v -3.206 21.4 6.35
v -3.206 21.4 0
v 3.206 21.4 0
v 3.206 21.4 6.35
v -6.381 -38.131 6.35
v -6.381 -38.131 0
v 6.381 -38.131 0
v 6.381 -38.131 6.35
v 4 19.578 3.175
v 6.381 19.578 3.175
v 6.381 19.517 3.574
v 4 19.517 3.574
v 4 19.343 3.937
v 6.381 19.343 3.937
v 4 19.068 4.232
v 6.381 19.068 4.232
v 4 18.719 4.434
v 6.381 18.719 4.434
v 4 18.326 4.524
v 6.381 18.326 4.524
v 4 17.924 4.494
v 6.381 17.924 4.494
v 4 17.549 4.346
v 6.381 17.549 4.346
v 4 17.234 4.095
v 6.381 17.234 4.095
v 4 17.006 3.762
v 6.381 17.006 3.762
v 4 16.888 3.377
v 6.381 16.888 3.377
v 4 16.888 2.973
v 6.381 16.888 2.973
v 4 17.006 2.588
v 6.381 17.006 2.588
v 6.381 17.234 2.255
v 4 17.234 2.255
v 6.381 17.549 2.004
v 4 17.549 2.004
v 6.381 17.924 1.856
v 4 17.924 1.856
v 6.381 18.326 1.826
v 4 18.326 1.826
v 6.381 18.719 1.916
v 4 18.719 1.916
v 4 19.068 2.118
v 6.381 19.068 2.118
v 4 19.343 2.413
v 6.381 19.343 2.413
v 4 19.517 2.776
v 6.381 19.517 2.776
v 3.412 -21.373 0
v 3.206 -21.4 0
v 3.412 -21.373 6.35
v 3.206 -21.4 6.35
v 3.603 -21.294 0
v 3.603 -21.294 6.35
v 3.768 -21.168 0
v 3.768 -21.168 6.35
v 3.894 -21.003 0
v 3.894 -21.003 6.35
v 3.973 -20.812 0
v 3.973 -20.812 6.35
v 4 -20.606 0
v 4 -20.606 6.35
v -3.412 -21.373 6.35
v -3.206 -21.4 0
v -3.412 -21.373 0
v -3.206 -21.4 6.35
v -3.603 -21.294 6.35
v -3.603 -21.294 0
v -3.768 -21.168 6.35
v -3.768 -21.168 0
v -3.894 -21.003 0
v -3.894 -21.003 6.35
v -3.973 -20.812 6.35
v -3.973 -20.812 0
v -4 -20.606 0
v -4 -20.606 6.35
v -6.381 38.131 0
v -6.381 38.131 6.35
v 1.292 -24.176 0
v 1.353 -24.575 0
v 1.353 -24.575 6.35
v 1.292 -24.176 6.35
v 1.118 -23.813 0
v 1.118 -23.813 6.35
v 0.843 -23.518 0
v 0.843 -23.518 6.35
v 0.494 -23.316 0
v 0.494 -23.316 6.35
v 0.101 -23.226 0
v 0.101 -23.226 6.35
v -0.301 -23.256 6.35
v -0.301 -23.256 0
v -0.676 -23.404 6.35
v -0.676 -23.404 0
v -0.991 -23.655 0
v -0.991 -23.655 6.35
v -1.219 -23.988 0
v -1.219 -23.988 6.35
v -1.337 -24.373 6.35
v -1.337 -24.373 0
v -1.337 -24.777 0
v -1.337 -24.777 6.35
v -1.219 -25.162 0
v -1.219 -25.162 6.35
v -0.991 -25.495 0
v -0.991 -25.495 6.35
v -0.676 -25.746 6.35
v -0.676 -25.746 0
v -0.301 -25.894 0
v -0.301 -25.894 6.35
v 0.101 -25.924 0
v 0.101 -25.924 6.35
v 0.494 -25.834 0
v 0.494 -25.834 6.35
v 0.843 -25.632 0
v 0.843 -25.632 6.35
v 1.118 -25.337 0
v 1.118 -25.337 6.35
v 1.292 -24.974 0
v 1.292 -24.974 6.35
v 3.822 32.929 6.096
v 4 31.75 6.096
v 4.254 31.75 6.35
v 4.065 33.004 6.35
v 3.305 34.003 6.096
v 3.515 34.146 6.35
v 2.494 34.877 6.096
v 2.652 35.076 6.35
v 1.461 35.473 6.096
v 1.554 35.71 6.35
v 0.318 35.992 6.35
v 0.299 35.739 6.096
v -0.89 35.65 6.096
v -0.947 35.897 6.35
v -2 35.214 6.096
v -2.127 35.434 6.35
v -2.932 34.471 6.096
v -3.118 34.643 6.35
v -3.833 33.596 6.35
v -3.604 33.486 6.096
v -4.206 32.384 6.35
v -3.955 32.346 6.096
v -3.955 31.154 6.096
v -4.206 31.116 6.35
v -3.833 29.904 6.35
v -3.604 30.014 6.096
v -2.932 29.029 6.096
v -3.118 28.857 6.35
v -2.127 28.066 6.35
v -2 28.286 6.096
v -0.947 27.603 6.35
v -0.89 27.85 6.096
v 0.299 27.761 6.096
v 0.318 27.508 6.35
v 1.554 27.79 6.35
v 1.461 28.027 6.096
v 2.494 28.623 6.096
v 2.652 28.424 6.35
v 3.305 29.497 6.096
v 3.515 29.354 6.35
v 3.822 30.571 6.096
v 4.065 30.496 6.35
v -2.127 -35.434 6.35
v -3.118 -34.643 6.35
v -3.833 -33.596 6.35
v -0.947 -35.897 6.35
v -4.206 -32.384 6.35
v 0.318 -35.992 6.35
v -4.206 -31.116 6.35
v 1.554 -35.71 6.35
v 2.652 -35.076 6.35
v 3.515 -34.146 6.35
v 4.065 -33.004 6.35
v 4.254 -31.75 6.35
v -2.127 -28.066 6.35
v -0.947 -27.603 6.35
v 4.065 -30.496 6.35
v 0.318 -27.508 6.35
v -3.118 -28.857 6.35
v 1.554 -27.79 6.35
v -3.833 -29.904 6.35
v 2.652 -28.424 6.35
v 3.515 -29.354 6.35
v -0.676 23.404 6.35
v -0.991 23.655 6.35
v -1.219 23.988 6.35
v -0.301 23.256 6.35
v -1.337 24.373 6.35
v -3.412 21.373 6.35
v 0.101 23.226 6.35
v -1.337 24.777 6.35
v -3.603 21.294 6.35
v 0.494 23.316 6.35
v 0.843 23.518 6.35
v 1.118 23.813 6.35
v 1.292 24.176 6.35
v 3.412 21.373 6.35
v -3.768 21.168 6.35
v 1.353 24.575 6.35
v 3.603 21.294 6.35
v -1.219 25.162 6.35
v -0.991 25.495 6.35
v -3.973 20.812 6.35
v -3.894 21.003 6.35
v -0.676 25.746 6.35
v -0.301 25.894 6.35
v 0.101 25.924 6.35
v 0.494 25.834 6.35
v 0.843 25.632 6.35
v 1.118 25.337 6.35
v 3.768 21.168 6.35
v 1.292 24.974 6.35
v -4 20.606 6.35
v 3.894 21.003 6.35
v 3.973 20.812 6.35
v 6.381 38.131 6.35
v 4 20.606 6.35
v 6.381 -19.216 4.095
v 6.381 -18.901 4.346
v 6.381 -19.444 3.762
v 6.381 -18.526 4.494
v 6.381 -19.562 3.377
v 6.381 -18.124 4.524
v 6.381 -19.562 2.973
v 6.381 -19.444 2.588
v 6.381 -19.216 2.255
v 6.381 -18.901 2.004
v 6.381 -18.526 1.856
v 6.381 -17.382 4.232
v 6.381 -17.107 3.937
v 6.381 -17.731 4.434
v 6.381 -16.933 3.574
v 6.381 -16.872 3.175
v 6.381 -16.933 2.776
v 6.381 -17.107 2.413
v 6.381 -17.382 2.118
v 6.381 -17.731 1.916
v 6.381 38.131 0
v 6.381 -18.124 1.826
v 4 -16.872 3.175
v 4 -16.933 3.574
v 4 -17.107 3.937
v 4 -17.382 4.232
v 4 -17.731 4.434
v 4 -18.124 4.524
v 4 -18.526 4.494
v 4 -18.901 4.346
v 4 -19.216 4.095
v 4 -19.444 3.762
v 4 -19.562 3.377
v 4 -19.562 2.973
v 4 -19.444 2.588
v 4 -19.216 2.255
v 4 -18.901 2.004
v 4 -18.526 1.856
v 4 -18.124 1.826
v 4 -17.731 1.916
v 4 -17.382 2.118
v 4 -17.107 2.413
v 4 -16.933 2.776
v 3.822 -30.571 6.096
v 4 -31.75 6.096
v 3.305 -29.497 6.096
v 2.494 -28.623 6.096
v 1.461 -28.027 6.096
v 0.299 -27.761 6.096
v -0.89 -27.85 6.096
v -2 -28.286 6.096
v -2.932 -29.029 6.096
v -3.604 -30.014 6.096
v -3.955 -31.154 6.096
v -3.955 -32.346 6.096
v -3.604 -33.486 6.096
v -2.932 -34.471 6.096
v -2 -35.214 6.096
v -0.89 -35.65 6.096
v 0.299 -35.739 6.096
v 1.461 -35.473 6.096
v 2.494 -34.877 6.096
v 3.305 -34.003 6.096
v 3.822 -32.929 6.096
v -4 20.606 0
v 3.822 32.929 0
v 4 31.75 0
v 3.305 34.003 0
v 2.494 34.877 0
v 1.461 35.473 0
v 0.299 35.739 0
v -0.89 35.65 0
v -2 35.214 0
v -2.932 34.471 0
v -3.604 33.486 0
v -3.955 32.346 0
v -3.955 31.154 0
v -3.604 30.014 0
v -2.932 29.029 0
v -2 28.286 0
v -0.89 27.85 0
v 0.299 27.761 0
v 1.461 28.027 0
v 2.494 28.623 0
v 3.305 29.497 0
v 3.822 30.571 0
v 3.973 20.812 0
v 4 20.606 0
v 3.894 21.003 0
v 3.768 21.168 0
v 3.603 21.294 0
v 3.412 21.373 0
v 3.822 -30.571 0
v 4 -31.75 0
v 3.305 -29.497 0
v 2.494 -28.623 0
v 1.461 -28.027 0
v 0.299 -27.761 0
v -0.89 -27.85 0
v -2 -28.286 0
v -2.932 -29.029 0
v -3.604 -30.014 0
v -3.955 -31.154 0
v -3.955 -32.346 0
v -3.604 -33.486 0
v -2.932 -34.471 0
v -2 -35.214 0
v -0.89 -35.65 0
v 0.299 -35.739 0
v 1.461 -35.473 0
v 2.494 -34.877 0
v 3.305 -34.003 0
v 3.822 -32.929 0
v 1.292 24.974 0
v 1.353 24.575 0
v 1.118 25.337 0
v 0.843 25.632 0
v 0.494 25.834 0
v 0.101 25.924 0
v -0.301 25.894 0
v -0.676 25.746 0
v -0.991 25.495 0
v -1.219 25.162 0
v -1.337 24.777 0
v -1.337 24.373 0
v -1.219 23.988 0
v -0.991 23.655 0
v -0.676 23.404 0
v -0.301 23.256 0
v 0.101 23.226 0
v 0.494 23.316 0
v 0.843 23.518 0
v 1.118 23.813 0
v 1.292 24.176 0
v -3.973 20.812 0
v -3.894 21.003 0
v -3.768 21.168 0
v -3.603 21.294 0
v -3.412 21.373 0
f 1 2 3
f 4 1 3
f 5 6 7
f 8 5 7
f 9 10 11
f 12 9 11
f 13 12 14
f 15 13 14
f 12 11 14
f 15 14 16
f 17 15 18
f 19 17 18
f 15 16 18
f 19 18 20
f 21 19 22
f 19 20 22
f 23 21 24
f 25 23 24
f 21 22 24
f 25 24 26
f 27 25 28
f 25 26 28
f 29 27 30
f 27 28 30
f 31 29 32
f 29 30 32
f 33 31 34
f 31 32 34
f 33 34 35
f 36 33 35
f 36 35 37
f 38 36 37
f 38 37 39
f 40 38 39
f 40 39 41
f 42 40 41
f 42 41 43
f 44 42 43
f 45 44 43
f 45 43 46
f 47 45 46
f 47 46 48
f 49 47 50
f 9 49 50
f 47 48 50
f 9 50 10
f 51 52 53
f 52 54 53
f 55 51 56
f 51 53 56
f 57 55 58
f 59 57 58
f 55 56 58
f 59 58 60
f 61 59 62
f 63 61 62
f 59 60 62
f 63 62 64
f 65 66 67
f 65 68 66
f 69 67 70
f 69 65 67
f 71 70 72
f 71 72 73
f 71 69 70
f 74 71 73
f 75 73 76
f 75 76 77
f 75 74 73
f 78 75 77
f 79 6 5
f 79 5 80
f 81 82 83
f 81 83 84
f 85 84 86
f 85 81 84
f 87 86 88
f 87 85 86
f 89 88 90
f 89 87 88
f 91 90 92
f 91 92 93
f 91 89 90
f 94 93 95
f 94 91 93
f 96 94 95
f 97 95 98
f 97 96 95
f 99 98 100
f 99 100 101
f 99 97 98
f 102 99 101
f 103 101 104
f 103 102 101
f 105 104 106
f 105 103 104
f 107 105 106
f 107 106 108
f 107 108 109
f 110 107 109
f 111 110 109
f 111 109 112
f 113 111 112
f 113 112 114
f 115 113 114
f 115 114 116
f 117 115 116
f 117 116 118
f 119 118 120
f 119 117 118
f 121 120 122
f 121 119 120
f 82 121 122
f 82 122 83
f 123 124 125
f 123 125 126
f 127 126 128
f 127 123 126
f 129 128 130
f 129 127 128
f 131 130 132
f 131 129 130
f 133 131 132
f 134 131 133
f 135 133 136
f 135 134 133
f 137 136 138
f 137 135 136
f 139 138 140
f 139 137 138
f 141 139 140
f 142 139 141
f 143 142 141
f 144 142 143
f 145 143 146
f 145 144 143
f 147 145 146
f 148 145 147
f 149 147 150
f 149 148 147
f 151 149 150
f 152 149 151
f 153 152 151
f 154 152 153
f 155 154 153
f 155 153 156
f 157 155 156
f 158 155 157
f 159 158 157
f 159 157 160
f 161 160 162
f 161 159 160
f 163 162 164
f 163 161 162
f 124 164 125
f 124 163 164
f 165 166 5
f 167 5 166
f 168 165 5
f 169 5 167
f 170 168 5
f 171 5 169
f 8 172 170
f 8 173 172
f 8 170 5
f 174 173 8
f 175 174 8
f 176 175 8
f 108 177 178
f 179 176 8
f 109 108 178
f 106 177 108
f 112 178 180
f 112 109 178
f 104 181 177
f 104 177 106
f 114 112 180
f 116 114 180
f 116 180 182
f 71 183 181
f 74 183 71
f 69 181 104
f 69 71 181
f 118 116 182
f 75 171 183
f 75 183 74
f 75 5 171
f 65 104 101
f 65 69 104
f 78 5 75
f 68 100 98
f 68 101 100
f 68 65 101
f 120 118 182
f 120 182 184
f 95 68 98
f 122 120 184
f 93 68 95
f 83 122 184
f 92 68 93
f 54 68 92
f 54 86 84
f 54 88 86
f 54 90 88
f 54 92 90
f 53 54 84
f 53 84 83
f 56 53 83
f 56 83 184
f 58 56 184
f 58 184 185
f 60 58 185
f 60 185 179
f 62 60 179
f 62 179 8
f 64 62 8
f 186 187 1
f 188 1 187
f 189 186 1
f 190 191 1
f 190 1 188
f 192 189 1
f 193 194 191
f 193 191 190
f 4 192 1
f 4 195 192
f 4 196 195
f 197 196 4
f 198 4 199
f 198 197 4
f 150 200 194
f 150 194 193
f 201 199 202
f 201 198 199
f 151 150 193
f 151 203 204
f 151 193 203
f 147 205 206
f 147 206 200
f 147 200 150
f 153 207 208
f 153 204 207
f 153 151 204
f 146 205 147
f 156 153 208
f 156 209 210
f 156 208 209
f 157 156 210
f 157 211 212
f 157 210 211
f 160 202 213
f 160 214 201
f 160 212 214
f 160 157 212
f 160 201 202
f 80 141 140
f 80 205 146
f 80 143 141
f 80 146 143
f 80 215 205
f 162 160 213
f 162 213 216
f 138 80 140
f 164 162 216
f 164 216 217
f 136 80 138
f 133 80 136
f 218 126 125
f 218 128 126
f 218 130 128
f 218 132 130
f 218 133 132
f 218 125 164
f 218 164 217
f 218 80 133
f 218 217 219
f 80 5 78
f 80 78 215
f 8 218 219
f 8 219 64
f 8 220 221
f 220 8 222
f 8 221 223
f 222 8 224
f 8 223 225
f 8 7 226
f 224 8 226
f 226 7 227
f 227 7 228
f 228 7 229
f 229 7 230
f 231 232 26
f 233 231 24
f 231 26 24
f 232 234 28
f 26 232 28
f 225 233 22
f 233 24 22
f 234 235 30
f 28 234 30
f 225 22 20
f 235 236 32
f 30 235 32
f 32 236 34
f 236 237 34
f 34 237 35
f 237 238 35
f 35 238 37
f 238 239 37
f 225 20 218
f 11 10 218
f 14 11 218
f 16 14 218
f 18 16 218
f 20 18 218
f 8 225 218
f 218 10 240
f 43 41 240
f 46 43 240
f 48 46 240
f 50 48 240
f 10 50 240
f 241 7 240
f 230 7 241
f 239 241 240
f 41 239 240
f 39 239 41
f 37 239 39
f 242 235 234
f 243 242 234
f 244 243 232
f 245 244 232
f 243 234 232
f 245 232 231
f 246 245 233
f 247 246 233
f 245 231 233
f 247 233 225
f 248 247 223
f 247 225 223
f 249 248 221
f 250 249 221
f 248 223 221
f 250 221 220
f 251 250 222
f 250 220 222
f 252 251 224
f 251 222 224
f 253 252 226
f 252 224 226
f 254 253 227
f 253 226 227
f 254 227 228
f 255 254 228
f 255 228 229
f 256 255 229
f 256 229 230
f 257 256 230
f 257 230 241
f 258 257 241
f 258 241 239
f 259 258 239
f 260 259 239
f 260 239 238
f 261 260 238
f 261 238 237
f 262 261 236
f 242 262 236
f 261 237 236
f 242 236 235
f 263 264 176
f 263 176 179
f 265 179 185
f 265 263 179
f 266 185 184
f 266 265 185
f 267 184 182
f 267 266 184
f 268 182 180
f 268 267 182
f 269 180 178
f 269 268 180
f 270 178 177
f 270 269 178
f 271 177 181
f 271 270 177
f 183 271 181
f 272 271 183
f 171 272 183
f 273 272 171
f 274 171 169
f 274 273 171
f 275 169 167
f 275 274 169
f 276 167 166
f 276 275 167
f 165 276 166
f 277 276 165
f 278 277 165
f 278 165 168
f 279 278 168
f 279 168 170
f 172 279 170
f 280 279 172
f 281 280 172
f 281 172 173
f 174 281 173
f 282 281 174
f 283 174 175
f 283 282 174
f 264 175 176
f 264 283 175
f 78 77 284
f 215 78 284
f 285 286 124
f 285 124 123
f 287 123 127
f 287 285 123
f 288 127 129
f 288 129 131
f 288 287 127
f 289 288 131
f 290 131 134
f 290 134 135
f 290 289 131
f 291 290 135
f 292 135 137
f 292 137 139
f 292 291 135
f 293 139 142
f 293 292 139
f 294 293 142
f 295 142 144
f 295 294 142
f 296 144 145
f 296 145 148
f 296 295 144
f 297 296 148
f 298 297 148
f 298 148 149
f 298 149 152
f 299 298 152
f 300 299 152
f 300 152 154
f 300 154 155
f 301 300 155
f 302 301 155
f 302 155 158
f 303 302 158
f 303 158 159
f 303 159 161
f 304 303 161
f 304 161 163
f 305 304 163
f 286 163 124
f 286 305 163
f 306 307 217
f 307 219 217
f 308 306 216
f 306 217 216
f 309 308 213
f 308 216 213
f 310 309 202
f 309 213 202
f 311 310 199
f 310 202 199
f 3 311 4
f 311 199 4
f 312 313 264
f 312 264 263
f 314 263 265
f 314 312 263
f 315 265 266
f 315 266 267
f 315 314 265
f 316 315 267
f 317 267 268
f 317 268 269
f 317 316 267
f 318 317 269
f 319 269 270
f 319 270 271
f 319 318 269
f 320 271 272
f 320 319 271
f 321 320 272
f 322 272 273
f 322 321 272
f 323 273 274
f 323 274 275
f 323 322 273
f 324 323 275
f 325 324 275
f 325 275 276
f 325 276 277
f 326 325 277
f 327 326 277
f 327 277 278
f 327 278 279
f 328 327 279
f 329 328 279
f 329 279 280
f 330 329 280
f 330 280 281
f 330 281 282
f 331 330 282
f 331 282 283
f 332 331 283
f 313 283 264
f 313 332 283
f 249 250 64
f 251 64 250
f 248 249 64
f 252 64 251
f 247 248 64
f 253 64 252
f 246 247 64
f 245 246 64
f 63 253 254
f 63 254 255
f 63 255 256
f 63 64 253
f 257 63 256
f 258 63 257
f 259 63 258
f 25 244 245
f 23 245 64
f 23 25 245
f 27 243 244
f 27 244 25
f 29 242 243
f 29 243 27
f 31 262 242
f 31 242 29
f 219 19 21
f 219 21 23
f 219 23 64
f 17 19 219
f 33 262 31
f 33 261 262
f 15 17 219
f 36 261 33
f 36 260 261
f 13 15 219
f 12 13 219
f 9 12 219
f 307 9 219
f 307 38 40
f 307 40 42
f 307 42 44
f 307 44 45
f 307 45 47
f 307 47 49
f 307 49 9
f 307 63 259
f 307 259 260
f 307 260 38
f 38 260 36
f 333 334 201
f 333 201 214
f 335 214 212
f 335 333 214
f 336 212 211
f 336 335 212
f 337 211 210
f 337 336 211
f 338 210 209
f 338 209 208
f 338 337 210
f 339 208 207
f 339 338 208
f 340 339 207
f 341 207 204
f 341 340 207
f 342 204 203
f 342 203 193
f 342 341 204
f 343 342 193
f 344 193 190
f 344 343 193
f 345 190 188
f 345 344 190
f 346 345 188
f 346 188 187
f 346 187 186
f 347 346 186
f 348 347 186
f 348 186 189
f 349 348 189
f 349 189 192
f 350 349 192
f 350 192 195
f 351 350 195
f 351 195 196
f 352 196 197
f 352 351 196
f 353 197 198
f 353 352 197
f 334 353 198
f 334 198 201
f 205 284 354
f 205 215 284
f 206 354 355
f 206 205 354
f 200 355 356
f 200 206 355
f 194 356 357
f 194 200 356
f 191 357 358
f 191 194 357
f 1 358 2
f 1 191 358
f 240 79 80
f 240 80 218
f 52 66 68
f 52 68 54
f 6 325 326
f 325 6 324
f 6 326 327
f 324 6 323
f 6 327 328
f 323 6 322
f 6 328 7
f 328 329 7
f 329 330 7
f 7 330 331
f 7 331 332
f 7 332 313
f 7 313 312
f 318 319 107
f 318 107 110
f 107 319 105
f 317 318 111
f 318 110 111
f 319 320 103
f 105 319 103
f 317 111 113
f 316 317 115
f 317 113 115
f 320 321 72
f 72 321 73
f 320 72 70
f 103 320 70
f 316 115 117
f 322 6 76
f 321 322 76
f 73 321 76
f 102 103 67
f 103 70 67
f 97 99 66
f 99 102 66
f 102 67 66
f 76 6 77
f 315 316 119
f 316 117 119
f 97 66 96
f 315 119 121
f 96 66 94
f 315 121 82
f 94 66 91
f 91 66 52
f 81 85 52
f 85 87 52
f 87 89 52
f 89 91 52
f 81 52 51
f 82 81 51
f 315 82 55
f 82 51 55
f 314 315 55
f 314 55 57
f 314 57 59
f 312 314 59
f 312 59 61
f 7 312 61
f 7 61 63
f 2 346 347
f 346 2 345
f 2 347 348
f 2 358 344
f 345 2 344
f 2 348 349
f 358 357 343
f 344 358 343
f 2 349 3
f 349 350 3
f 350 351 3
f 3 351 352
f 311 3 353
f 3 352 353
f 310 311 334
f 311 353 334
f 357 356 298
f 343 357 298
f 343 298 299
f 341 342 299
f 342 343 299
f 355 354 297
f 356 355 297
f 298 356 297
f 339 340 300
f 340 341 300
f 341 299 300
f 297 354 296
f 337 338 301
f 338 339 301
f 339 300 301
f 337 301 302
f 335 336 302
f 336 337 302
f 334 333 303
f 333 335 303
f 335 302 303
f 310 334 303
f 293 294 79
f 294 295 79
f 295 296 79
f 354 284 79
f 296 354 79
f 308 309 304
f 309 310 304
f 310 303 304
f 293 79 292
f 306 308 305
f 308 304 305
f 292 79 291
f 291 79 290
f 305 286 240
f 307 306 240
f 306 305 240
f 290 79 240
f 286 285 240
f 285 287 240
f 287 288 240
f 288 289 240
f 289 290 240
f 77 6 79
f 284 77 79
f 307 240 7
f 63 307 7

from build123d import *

# Parameters (mm, degrees)
F0_W     = 12.7625
F0_H     = 76.2625
F0_R     = 4
F0_R_2   = 1.35255
F0_W_2   = 8
F0_H_2   = 42.8
F1_DEPTH = 6.35
F2_R     = 0.79375
F3_SIZE  = 0.254
F4_R     = 1.35255
F5_DEPTH = 2.38125


with BuildPart() as f1:
    # F0 (on Top) → F1 (new body)
    with BuildSketch(Plane.XY):
        Rectangle(F0_W, F0_H)
        with Locations((0, -31.75)):
            Circle(F0_R, mode=Mode.SUBTRACT)
        with Locations((0, -24.575)):
            Circle(F0_R_2, mode=Mode.SUBTRACT)
        Rectangle(F0_W_2, F0_H_2, mode=Mode.SUBTRACT)
        with Locations((0, 24.575)):
            Circle(F0_R_2, mode=Mode.SUBTRACT)
        with Locations((0, 31.75)):
            Circle(F0_R, mode=Mode.SUBTRACT)
    extrude(amount=F1_DEPTH)

    # F2
    f2_edges = [f1.edges().sort_by_distance(p)[0] for p in [
        (4, -21.4, 3.175),
        (-4, -21.4, 3.175),
        (-4, 21.4, 3.175),
        (4, 21.4, 3.175),
    ]]
    fillet(f2_edges, radius=F2_R)

    # F3
    f3_edges = [f1.edges().sort_by_distance(p)[0] for p in [
        (-4, 31.75, 6.35),
        (-4, -31.75, 6.35),
    ]]
    chamfer(f3_edges, length=F3_SIZE)

    # F4 (on face) → F5 (cut, through all)
    with BuildSketch(Plane.YZ.offset(6.38125)):
        with Locations((-18.225, 3.175)):
            Circle(F4_R)
        with Locations((18.225, 3.175)):
            Circle(F4_R)
    extrude(amount=-F5_DEPTH, mode=Mode.SUBTRACT)


solid = f1.part
